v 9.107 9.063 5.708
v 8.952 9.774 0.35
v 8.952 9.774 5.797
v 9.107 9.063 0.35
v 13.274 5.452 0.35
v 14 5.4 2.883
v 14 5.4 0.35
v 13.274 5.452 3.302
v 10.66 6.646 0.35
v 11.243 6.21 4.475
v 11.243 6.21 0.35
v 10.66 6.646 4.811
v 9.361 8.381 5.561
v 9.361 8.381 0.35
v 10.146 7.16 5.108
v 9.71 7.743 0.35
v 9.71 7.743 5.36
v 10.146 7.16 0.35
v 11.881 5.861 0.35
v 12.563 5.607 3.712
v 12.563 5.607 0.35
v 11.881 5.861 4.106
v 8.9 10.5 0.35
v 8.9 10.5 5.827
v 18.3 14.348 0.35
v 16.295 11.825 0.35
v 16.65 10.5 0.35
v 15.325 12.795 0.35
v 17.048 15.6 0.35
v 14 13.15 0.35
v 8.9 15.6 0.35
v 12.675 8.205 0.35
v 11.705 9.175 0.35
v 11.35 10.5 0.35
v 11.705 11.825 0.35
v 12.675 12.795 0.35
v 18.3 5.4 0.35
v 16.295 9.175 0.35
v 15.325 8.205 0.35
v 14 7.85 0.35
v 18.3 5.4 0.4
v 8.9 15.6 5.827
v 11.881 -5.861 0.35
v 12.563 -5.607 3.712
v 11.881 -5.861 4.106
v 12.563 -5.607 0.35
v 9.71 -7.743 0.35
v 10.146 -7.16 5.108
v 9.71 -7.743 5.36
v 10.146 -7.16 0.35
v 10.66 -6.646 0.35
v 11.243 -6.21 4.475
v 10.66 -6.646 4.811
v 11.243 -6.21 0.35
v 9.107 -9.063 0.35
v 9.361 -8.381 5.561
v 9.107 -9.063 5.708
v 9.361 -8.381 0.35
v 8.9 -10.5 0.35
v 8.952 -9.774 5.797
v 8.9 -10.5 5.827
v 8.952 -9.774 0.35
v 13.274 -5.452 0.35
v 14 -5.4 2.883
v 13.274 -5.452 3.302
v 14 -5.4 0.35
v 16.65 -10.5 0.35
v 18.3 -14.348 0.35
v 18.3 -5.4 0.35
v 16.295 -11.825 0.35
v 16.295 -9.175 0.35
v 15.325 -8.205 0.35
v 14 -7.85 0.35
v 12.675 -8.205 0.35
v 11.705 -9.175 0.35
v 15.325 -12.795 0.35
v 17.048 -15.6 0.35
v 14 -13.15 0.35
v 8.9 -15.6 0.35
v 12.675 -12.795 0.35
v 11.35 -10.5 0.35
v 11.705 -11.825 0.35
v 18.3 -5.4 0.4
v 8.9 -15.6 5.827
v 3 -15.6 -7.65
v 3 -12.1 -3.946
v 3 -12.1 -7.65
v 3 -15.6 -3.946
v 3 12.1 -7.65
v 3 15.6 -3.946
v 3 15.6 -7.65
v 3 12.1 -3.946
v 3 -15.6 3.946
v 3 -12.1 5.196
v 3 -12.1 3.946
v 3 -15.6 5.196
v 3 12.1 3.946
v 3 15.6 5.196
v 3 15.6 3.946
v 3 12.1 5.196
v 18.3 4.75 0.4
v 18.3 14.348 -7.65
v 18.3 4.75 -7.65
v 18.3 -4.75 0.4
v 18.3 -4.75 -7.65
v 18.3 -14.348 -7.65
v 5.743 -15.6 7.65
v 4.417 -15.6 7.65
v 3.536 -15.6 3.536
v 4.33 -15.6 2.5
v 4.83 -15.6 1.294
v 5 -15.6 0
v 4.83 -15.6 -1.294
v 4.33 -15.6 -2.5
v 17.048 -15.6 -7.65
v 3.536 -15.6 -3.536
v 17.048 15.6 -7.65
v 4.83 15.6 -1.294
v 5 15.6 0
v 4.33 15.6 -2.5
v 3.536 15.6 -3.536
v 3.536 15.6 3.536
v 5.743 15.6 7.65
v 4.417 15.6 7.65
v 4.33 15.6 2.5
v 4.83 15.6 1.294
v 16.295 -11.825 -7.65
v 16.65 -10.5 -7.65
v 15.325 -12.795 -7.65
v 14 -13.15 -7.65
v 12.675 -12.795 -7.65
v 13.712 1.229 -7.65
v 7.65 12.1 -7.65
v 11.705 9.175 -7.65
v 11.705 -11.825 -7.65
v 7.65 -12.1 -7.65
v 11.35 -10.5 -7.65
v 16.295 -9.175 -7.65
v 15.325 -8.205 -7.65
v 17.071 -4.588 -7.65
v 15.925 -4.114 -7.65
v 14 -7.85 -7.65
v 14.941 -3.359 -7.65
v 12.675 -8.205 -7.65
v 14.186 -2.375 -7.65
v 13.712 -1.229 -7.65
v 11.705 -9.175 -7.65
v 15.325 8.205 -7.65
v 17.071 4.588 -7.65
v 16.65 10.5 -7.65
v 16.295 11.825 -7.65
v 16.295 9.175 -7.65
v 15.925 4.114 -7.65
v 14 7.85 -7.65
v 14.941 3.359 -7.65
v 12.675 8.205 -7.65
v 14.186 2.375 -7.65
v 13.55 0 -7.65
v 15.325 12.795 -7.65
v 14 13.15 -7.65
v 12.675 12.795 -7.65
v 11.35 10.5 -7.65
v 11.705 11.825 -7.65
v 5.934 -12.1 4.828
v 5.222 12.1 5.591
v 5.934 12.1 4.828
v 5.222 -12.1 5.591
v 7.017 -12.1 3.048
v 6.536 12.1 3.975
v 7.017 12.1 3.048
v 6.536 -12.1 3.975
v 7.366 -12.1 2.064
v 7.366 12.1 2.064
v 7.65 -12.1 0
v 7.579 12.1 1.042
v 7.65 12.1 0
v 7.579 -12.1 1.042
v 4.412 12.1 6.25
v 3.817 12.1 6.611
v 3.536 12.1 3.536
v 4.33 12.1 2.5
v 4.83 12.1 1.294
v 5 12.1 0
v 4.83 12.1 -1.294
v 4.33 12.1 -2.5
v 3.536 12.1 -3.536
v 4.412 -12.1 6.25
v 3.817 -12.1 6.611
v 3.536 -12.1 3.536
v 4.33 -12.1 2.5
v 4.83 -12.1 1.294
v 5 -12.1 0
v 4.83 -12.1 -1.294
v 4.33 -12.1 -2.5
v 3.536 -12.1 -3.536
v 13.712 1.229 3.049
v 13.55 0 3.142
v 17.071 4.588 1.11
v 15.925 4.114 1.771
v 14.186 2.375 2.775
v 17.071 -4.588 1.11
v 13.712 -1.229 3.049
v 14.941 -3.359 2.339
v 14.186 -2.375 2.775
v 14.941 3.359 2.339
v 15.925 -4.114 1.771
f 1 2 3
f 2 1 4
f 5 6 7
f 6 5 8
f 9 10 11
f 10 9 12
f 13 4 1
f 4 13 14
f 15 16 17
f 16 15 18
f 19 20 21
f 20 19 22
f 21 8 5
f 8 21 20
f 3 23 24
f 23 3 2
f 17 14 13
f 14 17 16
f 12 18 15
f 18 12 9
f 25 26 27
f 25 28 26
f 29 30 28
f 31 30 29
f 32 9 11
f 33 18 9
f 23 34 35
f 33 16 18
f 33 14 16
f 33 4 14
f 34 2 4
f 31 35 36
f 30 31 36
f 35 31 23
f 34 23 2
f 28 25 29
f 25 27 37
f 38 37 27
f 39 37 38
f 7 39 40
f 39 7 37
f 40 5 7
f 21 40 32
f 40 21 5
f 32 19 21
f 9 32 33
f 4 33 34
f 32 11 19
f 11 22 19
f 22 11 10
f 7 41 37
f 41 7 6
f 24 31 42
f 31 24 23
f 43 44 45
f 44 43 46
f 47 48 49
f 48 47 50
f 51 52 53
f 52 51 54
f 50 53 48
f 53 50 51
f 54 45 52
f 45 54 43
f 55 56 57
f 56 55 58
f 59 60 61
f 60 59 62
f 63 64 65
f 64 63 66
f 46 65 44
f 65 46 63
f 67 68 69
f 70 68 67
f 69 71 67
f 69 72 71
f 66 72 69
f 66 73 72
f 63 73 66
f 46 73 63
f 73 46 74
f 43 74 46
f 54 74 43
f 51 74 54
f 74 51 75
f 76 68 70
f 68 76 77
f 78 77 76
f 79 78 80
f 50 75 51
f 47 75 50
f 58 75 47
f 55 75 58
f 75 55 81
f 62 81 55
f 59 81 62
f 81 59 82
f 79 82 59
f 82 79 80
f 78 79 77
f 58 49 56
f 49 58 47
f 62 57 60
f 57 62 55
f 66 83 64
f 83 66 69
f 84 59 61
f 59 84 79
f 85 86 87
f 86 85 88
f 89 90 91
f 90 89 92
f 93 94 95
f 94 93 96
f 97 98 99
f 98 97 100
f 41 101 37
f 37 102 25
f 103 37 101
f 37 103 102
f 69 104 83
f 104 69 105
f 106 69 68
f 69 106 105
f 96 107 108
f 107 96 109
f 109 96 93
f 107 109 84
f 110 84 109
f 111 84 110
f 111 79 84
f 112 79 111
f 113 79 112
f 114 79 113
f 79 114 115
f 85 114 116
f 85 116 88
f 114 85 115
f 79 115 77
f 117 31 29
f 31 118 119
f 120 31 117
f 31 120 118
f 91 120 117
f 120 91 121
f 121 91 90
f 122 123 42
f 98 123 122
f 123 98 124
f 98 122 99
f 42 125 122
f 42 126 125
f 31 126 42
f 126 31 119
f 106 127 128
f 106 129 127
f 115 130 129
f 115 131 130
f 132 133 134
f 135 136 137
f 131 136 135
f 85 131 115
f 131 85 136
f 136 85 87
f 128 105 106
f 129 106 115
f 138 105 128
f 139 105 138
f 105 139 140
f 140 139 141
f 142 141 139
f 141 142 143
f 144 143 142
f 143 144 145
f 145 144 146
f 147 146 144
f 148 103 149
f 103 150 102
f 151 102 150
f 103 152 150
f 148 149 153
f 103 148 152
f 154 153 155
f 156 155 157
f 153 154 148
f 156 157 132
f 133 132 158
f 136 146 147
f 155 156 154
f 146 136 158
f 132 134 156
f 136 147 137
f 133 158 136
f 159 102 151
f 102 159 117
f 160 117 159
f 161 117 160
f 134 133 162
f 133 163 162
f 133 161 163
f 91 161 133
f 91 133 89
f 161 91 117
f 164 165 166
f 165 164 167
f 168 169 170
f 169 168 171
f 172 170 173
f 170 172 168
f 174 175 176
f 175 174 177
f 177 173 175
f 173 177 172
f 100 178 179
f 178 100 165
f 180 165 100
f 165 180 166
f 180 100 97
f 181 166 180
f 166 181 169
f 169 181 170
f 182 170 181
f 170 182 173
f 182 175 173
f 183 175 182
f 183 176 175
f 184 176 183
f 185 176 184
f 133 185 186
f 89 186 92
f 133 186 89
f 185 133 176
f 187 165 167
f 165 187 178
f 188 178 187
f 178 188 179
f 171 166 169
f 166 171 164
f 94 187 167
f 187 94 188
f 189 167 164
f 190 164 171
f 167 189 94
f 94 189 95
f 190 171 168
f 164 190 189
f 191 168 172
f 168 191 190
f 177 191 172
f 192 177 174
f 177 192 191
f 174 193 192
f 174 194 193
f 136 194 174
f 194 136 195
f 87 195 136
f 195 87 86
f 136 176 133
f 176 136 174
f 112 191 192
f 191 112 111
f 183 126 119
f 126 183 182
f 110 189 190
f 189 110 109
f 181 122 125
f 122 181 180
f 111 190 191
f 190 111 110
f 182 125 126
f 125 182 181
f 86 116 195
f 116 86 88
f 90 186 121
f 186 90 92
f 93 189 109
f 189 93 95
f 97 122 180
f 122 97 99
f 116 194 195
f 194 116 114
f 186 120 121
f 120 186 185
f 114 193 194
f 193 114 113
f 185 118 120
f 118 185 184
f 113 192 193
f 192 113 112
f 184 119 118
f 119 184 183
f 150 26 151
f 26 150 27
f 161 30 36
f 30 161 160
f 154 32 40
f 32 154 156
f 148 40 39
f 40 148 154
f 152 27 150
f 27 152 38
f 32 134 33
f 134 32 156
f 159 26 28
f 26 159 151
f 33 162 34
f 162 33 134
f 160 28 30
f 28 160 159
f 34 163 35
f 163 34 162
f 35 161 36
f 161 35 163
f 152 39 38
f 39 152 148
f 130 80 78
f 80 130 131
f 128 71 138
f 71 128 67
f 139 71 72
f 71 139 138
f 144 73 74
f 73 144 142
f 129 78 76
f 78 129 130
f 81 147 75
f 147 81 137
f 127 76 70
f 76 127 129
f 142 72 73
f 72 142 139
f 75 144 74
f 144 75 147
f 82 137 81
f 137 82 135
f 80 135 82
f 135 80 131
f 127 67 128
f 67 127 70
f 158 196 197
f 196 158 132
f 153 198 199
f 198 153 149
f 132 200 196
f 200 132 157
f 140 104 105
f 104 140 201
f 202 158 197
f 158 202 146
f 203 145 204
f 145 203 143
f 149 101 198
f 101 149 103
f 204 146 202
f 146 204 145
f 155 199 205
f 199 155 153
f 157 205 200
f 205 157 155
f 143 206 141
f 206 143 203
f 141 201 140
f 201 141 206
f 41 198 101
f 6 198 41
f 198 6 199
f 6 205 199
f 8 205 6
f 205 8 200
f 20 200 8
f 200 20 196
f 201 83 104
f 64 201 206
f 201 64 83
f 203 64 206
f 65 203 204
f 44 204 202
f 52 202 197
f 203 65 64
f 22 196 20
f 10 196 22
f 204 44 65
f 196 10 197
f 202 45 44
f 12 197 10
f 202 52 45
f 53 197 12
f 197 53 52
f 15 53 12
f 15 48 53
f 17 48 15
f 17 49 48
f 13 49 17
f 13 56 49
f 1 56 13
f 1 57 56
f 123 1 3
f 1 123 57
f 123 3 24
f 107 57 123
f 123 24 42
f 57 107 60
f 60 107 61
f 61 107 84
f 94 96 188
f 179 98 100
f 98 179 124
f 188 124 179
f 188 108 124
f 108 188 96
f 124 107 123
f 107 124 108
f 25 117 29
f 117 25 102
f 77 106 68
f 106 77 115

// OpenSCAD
//////////////////////////////////////////////////////////////////////////////////////////////
// Zero height LM8UU bearing holder
//
// Copyright (C) 2013  Lochner, Juergen
// http://www.thingiverse.com/Ablapo/designs
//
// This program is free software; you can redistribute it and/or
// modify it under the terms of the GNU General Public License
// as published by the Free Software Foundation; either version 2
// of the License, or (at your option) any later version.
//
// This program is distributed in the hope that it will be useful,
// but WITHOUT ANY WARRANTY; without even the implied warranty of
// MERCHANTABILITY or FITNESS FOR A PARTICULAR PURPOSE.  See the
// GNU General Public License for more details.
//
// You should have received a copy of the GNU General Public License
// along with this program; if not, write to the Free Software
// Foundation, Inc., 51 Franklin Street, Fifth Floor, Boston, MA  02110-1301, USA.
/////////////////////////////////////////////////////////////////////////////////////////////////

// bearing's length
b_length=24.2 ;		
// bearing's diameter
b_dia= 15.3;		

// x distance of holes
dx=28;			
// y distance of holes	
dy=21;				

angle=60;			// holder cut off angle
b_angle=30;		// bearing cut off angle

bolt=4.9+0.4;		// M5 bolt diameter
nut=9.8+0.4; 		// washer's size 

rod=8+2;			// round cut at center rod
zcutoff=0;		// 0= cut height at bearing's height

boltlength=20-6-4-1-1;   // 20 mm bolt, 6 mm aluplate, 4mm nut, 1mm washer

module holder(){
intersection(){
	difference(){

		translate([b_dia/2+3,0,0.5]) rotate([90,0,0])cube ([b_dia,b_dia+1,b_length+8-1],center=true);
		#rotate([90,0,0]) cylinder(h=b_length,r=b_dia/2,center=true,$fn=46);								// cut bearing
		translate([0 ,0,-b_dia/2]) rotate([90,0,0])cube ([b_dia,b_dia,b_length],center=true);			// cut below bearing

		#rotate([90,0,0]) cylinder(h=b_length+15,r=rod/2,center=true,$fn=24);								// cut center rod
 
		#translate([dx/2,dy/2,0])cylinder(h=b_dia*3,r=bolt/2, center=true,$fn=12);						// cut bolt 1
		translate([dx/2,dy/2,0.5+boltlength])
			union(){
				cylinder(h=b_dia+1,r=nut/2, center=true,$fn=44);
				translate([nut/2,0,0])cube ([nut,nut,b_dia+1],center=true);
				translate([0,nut/2,0])cube ([nut,nut,b_dia+1],center=true);
			}
	
		#translate([dx/2,-dy/2,0])cylinder(h=b_dia*3,r=bolt/2, center=true,$fn=12);						// cut bolt 2
		translate([dx/2,-dy/2,0.5+boltlength])
			union(){
				cylinder(h=b_dia+1,r=nut/2, center=true,$fn=44);
				translate([ nut/2,0,0])cube ([nut,nut,b_dia+1],center=true);
				translate([0,-nut/2,0])cube ([nut,nut,b_dia+1],center=true);
			}

		translate([b_dia+3,0,0]) cylinder(h=b_length+15,r=9.5/2,center=true,$fn=24);						// slim cut

		translate([b_dia+3,0,0.4])rotate([0,-angle,0])translate([b_dia*1.5,0,b_dia*1.5])cube([b_dia*3,b_length+8+1,b_dia*3],center=true); // cut holder angle
		rotate([0,b_angle,0])translate([-b_dia*1.5,0,b_dia*1.5])cube([b_dia*3,b_length+8+1,b_dia*3],center=true);		// cut bearing angle
		translate([0,0,b_dia*1.5-b_dia/2+b_dia+zcutoff])cube([b_dia*3,b_length+8+1,b_dia*3],center=true);		// cut top

	}

	cylinder(h=b_dia*4,r=b_length-0.3,center=true,$fn=12);
}
}

module spacer(){
	difference(){
		cylinder(h=6,r=10/2-0.1,center=true,$fn=44);
		cylinder(h=7,r=8/2,center=true,$fn=44);
	}
}

module plate(){
	translate([-2,0,0])holder();
	translate([2,0,0])rotate([0,0,180]) holder();
}

//plate();
holder();
